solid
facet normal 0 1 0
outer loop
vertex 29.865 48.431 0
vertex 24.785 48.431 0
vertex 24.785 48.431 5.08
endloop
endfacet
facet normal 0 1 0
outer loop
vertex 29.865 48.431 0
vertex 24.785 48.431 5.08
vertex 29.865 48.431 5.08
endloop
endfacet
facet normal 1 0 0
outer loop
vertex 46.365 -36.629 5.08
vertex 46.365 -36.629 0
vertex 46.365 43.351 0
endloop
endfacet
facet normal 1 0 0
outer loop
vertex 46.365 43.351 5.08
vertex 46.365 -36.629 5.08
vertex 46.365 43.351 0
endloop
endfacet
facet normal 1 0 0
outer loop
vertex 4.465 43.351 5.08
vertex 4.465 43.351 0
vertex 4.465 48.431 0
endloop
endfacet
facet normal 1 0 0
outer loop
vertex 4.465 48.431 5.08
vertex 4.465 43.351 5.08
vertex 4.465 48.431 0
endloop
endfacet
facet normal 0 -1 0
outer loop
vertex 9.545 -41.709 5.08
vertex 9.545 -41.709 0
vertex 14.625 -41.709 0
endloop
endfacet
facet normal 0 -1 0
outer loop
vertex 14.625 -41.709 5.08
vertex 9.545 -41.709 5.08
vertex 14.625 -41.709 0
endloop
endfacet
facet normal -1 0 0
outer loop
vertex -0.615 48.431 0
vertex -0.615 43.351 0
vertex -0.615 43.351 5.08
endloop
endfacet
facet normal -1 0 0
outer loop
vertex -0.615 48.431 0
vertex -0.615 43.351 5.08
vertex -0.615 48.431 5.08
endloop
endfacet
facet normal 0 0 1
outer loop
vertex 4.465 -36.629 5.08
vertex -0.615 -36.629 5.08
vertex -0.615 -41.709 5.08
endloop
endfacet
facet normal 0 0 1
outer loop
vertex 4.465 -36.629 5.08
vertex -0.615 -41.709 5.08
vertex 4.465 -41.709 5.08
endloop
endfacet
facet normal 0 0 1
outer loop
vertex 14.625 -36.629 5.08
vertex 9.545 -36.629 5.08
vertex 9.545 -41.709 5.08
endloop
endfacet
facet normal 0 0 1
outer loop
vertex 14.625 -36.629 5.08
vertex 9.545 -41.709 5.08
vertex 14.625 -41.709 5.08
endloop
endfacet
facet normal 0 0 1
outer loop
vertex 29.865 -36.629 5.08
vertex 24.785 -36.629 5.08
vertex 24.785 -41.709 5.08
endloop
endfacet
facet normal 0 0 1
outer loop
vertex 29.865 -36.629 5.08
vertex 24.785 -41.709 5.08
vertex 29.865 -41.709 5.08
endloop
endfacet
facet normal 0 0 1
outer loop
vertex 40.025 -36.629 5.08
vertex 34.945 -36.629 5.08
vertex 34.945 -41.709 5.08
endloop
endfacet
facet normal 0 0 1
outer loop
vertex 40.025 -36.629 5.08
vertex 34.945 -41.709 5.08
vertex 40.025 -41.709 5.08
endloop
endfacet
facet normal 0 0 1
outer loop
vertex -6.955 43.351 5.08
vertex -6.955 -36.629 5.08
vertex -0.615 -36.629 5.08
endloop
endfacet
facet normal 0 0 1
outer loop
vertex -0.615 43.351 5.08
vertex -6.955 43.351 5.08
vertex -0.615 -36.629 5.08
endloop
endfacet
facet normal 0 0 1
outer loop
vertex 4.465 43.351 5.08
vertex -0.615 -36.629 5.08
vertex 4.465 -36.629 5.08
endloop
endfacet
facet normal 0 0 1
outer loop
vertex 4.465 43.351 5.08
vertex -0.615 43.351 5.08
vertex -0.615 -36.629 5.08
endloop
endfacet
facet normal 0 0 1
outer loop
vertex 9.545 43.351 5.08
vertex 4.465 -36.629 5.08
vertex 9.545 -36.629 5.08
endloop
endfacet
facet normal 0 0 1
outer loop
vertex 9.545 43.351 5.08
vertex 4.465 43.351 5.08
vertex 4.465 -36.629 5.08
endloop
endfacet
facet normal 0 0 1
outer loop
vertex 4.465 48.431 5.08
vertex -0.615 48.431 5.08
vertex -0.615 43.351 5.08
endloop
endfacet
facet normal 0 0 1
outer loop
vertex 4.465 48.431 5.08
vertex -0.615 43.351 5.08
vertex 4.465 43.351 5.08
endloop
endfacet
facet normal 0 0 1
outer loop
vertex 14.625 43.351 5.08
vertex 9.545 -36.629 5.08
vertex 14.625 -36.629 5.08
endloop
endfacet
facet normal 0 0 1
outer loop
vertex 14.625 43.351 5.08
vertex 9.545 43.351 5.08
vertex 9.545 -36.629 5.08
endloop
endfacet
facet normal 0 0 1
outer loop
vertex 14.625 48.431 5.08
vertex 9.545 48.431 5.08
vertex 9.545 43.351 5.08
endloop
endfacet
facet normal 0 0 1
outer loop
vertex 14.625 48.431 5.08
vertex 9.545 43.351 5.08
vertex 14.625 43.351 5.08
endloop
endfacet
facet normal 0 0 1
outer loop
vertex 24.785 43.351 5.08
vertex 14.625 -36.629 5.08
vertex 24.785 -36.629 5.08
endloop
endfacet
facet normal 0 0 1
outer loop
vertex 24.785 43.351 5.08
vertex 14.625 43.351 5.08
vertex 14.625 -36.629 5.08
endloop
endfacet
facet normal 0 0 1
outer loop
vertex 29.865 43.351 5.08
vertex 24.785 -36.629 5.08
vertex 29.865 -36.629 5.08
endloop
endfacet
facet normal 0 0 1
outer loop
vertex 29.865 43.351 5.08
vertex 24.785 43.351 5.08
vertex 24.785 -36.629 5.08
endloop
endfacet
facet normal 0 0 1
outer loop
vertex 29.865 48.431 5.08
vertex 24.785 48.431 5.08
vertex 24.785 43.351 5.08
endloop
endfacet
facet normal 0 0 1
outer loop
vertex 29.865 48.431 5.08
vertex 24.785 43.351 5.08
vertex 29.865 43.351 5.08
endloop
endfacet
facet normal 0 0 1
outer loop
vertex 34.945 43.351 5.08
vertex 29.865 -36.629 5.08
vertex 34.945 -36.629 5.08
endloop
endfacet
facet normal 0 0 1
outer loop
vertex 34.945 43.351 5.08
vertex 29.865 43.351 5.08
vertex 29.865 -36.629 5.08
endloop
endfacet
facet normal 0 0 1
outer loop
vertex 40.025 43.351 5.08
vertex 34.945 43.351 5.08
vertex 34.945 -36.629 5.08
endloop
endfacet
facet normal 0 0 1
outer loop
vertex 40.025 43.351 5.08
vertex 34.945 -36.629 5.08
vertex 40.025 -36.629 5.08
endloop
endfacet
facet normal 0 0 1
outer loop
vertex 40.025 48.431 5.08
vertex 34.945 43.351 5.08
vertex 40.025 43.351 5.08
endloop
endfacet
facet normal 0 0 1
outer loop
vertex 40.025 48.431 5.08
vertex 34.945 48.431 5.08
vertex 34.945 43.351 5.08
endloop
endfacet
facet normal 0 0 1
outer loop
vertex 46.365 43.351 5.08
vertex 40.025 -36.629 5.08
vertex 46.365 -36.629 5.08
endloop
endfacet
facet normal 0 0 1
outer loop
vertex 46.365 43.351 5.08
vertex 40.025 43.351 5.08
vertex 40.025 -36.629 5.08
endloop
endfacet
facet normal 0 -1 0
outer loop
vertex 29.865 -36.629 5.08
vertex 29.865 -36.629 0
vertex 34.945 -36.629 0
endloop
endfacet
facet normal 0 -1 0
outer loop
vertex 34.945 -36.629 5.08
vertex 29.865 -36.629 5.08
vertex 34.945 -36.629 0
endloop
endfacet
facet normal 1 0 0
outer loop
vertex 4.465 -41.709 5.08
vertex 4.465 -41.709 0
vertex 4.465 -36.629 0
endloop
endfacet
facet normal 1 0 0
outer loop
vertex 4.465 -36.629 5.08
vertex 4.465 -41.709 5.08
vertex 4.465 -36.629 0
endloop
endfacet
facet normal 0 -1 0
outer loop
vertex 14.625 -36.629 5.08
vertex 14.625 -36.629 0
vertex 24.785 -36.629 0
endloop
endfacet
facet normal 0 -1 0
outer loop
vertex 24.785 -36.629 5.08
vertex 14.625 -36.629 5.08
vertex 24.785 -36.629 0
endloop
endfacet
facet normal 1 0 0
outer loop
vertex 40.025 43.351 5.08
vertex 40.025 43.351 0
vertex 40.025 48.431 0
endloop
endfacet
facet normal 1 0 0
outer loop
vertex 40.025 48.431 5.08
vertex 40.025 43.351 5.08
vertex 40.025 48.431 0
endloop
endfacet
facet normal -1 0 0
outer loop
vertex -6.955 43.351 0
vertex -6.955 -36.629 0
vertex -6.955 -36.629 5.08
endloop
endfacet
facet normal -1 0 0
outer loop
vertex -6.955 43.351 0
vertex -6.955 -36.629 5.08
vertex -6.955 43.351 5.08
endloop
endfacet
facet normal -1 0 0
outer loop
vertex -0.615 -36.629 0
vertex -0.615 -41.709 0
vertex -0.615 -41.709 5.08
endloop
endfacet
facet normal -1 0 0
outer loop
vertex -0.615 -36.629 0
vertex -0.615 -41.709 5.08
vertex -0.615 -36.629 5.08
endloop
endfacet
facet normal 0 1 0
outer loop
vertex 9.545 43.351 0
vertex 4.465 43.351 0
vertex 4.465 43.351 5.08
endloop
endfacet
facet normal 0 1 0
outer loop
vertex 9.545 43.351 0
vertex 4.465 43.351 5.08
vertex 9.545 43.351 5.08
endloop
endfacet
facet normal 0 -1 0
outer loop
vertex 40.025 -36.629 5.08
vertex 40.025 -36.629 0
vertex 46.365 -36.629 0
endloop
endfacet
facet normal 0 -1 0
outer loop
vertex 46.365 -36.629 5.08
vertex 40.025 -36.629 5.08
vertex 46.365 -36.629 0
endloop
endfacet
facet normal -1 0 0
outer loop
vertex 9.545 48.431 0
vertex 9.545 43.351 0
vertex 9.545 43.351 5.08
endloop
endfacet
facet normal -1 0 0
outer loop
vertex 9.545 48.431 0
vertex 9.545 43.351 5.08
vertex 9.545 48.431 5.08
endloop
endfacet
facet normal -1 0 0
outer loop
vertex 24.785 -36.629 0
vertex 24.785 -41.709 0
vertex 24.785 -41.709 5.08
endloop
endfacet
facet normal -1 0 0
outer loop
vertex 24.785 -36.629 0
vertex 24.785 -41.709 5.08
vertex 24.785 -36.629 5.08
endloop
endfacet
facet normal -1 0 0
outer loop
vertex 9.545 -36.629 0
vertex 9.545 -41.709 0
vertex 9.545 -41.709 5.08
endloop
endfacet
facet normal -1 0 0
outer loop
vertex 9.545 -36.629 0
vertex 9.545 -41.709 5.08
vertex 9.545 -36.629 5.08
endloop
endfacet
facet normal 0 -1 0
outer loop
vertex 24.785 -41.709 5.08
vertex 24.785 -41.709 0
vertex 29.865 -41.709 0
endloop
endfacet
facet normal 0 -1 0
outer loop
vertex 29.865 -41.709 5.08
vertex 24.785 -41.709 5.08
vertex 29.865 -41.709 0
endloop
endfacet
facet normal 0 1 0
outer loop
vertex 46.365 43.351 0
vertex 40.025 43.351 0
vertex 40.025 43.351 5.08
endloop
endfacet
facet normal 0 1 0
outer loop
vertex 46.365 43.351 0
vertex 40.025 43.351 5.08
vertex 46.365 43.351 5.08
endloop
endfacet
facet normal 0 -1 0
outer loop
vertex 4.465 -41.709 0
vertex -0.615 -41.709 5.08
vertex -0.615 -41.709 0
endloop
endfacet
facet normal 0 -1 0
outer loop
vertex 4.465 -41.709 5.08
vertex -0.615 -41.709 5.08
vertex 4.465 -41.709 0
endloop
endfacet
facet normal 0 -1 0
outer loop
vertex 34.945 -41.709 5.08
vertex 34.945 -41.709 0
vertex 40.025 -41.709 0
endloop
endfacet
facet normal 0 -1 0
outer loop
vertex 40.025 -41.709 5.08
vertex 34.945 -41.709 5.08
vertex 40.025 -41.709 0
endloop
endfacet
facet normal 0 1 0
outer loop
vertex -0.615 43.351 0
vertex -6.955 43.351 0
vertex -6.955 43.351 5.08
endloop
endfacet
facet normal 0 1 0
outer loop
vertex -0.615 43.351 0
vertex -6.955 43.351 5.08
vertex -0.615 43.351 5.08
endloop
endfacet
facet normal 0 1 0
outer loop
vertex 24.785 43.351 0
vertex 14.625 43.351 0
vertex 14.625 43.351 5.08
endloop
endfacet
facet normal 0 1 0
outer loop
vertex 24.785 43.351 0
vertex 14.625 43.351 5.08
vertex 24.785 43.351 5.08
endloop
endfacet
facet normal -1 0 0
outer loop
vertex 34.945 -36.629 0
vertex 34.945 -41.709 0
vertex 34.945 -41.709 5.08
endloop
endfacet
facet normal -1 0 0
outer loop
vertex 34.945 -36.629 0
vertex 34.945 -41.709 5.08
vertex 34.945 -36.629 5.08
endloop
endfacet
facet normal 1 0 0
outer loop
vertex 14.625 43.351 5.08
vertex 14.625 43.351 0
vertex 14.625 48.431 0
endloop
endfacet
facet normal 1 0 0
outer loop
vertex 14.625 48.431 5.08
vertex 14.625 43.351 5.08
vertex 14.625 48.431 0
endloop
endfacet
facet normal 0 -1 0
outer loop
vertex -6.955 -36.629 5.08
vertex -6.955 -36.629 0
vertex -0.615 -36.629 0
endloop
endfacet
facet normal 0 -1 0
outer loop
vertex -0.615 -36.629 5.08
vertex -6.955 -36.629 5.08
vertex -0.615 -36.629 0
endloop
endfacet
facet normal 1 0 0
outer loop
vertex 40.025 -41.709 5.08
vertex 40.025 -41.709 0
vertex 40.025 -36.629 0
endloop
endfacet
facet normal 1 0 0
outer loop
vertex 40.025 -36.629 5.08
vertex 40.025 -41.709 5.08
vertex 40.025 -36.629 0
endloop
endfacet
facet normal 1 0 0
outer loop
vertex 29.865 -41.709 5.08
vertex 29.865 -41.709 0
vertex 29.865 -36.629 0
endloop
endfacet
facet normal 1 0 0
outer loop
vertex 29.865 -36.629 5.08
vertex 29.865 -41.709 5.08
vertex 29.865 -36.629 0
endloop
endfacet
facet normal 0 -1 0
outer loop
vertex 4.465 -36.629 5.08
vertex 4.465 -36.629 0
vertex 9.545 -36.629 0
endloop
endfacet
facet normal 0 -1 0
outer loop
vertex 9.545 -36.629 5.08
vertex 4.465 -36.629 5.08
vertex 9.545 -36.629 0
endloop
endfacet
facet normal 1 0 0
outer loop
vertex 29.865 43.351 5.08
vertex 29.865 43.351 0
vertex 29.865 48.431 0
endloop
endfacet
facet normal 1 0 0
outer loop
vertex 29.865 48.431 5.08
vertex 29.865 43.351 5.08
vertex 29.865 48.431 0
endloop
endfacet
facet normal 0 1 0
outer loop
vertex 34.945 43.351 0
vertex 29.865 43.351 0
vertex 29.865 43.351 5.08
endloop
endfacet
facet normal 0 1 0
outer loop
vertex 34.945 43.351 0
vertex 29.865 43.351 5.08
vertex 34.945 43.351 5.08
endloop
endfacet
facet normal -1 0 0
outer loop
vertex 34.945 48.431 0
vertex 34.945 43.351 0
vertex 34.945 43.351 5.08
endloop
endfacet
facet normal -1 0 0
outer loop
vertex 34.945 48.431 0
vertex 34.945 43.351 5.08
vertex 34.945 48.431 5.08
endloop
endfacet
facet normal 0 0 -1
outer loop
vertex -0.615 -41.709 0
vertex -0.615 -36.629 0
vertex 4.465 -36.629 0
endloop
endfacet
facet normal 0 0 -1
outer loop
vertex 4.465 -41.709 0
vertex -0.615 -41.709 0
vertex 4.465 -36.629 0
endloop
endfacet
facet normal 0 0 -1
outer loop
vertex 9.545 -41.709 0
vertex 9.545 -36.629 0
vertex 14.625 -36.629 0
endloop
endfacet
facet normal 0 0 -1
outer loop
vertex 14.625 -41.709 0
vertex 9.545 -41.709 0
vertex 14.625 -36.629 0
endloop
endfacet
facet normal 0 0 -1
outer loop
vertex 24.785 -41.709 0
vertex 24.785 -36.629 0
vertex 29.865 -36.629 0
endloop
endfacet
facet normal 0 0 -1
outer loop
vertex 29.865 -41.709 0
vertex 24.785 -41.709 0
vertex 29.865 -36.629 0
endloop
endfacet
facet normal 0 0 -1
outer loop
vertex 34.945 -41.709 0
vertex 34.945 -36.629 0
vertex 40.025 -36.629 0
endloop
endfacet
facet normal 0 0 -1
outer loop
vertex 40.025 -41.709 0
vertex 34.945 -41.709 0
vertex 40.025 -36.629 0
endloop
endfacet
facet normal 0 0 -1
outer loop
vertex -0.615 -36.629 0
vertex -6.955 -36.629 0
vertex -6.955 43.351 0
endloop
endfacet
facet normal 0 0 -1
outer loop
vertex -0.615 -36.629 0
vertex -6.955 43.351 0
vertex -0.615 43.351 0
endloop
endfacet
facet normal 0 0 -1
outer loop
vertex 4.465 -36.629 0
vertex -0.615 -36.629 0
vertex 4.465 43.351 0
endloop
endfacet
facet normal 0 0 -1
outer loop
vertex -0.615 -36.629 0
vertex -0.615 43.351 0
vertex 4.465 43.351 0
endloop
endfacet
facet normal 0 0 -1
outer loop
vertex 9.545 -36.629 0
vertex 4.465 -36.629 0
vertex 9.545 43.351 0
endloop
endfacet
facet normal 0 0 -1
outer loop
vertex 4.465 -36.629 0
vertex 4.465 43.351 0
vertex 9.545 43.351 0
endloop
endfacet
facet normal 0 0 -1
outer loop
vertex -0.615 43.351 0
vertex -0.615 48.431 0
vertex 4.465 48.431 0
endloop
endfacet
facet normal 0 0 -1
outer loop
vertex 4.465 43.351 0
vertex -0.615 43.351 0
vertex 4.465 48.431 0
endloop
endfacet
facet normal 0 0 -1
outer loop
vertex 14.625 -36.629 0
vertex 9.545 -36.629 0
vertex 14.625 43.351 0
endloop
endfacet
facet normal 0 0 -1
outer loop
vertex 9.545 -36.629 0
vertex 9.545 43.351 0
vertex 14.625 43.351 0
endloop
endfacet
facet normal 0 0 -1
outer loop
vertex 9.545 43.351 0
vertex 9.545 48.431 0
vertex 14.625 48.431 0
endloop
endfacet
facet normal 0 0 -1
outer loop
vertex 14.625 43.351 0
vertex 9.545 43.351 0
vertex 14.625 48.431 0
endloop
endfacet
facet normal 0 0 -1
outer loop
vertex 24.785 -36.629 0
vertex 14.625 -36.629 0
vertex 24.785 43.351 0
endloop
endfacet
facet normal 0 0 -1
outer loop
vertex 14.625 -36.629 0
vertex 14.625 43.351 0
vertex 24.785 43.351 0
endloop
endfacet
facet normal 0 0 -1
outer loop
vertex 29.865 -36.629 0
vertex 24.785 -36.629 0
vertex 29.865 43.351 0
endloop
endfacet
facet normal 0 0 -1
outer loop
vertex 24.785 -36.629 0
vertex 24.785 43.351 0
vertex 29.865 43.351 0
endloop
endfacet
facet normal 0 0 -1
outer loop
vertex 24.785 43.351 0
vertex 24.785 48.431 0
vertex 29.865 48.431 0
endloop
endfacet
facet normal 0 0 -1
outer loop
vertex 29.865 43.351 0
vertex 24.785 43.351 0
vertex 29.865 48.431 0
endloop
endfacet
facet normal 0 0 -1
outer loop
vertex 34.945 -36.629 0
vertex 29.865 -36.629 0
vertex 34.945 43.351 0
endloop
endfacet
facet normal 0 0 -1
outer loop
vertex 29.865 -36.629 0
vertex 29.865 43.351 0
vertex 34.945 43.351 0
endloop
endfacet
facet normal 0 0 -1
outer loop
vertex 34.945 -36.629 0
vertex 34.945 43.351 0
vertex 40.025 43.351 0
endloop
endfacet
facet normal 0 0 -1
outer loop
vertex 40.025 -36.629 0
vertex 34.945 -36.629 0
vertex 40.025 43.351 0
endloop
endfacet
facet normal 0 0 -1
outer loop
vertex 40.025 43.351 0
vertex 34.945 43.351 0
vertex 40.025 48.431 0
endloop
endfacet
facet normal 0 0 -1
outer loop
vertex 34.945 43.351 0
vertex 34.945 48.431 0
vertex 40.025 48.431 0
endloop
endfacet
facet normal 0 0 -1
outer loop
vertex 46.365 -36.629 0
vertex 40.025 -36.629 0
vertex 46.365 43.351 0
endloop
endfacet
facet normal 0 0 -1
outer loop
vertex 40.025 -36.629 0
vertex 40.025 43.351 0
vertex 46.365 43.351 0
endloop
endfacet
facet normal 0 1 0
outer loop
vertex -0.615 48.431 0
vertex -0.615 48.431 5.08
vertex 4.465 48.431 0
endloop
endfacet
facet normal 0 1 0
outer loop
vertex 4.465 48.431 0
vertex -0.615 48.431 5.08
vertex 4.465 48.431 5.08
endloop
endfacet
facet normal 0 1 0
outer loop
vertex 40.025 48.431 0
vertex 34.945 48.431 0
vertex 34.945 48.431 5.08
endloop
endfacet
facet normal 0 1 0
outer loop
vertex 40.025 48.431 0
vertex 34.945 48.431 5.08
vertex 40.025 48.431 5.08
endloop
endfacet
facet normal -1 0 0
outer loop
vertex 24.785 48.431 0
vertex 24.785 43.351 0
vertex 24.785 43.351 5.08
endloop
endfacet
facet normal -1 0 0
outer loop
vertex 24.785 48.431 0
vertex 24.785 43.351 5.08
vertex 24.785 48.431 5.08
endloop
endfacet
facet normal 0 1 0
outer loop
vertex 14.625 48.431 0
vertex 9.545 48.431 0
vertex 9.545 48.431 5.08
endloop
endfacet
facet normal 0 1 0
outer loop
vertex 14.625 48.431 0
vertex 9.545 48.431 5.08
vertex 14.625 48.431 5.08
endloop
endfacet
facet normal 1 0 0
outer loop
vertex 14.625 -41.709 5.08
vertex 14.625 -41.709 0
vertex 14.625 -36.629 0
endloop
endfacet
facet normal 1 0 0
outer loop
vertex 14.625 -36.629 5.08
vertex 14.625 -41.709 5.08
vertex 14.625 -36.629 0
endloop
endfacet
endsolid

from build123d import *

# Parameters (mm, degrees)
SKETCH1_W           = 53.32
SKETCH1_H           = 79.98
BOSS_EXTRUDE1_DEPTH = 5.08
SKETCH2_W           = 5.08
SKETCH2_H           = 5.08
BOSS_EXTRUDE2_DEPTH = 5.08


with BuildPart() as part:
    # Sketch1 → Boss-Extrude1 (new body)
    with BuildSketch(Plane.XY):
        with Locations((19.705217391, 3.361478261)):
            Rectangle(SKETCH1_W, SKETCH1_H)
    extrude(amount=BOSS_EXTRUDE1_DEPTH)

    # Sketch2 → Boss-Extrude2 (add)
    with BuildSketch(Plane.XY.offset(5.08)):
        with Locations((1.925217391, 45.891478261)):
            Rectangle(SKETCH2_W, SKETCH2_H)
        with Locations((27.325217391, 45.891478261)):
            Rectangle(SKETCH2_W, SKETCH2_H)
        with Locations((37.485217391, 45.891478261)):
            Rectangle(SKETCH2_W, SKETCH2_H)
        with Locations((12.085217391, 45.891478261)):
            Rectangle(SKETCH2_W, SKETCH2_H)
        with Locations((12.085217391, -39.168521739)):
            Rectangle(SKETCH2_W, SKETCH2_H)
        with Locations((1.925217391, -39.168521739)):
            Rectangle(SKETCH2_W, SKETCH2_H)
        with Locations((37.485217391, -39.168521739)):
            Rectangle(SKETCH2_W, SKETCH2_H)
        with Locations((27.325217391, -39.168521739)):
            Rectangle(SKETCH2_W, SKETCH2_H)
    extrude(amount=-BOSS_EXTRUDE2_DEPTH)


solid = part.part
